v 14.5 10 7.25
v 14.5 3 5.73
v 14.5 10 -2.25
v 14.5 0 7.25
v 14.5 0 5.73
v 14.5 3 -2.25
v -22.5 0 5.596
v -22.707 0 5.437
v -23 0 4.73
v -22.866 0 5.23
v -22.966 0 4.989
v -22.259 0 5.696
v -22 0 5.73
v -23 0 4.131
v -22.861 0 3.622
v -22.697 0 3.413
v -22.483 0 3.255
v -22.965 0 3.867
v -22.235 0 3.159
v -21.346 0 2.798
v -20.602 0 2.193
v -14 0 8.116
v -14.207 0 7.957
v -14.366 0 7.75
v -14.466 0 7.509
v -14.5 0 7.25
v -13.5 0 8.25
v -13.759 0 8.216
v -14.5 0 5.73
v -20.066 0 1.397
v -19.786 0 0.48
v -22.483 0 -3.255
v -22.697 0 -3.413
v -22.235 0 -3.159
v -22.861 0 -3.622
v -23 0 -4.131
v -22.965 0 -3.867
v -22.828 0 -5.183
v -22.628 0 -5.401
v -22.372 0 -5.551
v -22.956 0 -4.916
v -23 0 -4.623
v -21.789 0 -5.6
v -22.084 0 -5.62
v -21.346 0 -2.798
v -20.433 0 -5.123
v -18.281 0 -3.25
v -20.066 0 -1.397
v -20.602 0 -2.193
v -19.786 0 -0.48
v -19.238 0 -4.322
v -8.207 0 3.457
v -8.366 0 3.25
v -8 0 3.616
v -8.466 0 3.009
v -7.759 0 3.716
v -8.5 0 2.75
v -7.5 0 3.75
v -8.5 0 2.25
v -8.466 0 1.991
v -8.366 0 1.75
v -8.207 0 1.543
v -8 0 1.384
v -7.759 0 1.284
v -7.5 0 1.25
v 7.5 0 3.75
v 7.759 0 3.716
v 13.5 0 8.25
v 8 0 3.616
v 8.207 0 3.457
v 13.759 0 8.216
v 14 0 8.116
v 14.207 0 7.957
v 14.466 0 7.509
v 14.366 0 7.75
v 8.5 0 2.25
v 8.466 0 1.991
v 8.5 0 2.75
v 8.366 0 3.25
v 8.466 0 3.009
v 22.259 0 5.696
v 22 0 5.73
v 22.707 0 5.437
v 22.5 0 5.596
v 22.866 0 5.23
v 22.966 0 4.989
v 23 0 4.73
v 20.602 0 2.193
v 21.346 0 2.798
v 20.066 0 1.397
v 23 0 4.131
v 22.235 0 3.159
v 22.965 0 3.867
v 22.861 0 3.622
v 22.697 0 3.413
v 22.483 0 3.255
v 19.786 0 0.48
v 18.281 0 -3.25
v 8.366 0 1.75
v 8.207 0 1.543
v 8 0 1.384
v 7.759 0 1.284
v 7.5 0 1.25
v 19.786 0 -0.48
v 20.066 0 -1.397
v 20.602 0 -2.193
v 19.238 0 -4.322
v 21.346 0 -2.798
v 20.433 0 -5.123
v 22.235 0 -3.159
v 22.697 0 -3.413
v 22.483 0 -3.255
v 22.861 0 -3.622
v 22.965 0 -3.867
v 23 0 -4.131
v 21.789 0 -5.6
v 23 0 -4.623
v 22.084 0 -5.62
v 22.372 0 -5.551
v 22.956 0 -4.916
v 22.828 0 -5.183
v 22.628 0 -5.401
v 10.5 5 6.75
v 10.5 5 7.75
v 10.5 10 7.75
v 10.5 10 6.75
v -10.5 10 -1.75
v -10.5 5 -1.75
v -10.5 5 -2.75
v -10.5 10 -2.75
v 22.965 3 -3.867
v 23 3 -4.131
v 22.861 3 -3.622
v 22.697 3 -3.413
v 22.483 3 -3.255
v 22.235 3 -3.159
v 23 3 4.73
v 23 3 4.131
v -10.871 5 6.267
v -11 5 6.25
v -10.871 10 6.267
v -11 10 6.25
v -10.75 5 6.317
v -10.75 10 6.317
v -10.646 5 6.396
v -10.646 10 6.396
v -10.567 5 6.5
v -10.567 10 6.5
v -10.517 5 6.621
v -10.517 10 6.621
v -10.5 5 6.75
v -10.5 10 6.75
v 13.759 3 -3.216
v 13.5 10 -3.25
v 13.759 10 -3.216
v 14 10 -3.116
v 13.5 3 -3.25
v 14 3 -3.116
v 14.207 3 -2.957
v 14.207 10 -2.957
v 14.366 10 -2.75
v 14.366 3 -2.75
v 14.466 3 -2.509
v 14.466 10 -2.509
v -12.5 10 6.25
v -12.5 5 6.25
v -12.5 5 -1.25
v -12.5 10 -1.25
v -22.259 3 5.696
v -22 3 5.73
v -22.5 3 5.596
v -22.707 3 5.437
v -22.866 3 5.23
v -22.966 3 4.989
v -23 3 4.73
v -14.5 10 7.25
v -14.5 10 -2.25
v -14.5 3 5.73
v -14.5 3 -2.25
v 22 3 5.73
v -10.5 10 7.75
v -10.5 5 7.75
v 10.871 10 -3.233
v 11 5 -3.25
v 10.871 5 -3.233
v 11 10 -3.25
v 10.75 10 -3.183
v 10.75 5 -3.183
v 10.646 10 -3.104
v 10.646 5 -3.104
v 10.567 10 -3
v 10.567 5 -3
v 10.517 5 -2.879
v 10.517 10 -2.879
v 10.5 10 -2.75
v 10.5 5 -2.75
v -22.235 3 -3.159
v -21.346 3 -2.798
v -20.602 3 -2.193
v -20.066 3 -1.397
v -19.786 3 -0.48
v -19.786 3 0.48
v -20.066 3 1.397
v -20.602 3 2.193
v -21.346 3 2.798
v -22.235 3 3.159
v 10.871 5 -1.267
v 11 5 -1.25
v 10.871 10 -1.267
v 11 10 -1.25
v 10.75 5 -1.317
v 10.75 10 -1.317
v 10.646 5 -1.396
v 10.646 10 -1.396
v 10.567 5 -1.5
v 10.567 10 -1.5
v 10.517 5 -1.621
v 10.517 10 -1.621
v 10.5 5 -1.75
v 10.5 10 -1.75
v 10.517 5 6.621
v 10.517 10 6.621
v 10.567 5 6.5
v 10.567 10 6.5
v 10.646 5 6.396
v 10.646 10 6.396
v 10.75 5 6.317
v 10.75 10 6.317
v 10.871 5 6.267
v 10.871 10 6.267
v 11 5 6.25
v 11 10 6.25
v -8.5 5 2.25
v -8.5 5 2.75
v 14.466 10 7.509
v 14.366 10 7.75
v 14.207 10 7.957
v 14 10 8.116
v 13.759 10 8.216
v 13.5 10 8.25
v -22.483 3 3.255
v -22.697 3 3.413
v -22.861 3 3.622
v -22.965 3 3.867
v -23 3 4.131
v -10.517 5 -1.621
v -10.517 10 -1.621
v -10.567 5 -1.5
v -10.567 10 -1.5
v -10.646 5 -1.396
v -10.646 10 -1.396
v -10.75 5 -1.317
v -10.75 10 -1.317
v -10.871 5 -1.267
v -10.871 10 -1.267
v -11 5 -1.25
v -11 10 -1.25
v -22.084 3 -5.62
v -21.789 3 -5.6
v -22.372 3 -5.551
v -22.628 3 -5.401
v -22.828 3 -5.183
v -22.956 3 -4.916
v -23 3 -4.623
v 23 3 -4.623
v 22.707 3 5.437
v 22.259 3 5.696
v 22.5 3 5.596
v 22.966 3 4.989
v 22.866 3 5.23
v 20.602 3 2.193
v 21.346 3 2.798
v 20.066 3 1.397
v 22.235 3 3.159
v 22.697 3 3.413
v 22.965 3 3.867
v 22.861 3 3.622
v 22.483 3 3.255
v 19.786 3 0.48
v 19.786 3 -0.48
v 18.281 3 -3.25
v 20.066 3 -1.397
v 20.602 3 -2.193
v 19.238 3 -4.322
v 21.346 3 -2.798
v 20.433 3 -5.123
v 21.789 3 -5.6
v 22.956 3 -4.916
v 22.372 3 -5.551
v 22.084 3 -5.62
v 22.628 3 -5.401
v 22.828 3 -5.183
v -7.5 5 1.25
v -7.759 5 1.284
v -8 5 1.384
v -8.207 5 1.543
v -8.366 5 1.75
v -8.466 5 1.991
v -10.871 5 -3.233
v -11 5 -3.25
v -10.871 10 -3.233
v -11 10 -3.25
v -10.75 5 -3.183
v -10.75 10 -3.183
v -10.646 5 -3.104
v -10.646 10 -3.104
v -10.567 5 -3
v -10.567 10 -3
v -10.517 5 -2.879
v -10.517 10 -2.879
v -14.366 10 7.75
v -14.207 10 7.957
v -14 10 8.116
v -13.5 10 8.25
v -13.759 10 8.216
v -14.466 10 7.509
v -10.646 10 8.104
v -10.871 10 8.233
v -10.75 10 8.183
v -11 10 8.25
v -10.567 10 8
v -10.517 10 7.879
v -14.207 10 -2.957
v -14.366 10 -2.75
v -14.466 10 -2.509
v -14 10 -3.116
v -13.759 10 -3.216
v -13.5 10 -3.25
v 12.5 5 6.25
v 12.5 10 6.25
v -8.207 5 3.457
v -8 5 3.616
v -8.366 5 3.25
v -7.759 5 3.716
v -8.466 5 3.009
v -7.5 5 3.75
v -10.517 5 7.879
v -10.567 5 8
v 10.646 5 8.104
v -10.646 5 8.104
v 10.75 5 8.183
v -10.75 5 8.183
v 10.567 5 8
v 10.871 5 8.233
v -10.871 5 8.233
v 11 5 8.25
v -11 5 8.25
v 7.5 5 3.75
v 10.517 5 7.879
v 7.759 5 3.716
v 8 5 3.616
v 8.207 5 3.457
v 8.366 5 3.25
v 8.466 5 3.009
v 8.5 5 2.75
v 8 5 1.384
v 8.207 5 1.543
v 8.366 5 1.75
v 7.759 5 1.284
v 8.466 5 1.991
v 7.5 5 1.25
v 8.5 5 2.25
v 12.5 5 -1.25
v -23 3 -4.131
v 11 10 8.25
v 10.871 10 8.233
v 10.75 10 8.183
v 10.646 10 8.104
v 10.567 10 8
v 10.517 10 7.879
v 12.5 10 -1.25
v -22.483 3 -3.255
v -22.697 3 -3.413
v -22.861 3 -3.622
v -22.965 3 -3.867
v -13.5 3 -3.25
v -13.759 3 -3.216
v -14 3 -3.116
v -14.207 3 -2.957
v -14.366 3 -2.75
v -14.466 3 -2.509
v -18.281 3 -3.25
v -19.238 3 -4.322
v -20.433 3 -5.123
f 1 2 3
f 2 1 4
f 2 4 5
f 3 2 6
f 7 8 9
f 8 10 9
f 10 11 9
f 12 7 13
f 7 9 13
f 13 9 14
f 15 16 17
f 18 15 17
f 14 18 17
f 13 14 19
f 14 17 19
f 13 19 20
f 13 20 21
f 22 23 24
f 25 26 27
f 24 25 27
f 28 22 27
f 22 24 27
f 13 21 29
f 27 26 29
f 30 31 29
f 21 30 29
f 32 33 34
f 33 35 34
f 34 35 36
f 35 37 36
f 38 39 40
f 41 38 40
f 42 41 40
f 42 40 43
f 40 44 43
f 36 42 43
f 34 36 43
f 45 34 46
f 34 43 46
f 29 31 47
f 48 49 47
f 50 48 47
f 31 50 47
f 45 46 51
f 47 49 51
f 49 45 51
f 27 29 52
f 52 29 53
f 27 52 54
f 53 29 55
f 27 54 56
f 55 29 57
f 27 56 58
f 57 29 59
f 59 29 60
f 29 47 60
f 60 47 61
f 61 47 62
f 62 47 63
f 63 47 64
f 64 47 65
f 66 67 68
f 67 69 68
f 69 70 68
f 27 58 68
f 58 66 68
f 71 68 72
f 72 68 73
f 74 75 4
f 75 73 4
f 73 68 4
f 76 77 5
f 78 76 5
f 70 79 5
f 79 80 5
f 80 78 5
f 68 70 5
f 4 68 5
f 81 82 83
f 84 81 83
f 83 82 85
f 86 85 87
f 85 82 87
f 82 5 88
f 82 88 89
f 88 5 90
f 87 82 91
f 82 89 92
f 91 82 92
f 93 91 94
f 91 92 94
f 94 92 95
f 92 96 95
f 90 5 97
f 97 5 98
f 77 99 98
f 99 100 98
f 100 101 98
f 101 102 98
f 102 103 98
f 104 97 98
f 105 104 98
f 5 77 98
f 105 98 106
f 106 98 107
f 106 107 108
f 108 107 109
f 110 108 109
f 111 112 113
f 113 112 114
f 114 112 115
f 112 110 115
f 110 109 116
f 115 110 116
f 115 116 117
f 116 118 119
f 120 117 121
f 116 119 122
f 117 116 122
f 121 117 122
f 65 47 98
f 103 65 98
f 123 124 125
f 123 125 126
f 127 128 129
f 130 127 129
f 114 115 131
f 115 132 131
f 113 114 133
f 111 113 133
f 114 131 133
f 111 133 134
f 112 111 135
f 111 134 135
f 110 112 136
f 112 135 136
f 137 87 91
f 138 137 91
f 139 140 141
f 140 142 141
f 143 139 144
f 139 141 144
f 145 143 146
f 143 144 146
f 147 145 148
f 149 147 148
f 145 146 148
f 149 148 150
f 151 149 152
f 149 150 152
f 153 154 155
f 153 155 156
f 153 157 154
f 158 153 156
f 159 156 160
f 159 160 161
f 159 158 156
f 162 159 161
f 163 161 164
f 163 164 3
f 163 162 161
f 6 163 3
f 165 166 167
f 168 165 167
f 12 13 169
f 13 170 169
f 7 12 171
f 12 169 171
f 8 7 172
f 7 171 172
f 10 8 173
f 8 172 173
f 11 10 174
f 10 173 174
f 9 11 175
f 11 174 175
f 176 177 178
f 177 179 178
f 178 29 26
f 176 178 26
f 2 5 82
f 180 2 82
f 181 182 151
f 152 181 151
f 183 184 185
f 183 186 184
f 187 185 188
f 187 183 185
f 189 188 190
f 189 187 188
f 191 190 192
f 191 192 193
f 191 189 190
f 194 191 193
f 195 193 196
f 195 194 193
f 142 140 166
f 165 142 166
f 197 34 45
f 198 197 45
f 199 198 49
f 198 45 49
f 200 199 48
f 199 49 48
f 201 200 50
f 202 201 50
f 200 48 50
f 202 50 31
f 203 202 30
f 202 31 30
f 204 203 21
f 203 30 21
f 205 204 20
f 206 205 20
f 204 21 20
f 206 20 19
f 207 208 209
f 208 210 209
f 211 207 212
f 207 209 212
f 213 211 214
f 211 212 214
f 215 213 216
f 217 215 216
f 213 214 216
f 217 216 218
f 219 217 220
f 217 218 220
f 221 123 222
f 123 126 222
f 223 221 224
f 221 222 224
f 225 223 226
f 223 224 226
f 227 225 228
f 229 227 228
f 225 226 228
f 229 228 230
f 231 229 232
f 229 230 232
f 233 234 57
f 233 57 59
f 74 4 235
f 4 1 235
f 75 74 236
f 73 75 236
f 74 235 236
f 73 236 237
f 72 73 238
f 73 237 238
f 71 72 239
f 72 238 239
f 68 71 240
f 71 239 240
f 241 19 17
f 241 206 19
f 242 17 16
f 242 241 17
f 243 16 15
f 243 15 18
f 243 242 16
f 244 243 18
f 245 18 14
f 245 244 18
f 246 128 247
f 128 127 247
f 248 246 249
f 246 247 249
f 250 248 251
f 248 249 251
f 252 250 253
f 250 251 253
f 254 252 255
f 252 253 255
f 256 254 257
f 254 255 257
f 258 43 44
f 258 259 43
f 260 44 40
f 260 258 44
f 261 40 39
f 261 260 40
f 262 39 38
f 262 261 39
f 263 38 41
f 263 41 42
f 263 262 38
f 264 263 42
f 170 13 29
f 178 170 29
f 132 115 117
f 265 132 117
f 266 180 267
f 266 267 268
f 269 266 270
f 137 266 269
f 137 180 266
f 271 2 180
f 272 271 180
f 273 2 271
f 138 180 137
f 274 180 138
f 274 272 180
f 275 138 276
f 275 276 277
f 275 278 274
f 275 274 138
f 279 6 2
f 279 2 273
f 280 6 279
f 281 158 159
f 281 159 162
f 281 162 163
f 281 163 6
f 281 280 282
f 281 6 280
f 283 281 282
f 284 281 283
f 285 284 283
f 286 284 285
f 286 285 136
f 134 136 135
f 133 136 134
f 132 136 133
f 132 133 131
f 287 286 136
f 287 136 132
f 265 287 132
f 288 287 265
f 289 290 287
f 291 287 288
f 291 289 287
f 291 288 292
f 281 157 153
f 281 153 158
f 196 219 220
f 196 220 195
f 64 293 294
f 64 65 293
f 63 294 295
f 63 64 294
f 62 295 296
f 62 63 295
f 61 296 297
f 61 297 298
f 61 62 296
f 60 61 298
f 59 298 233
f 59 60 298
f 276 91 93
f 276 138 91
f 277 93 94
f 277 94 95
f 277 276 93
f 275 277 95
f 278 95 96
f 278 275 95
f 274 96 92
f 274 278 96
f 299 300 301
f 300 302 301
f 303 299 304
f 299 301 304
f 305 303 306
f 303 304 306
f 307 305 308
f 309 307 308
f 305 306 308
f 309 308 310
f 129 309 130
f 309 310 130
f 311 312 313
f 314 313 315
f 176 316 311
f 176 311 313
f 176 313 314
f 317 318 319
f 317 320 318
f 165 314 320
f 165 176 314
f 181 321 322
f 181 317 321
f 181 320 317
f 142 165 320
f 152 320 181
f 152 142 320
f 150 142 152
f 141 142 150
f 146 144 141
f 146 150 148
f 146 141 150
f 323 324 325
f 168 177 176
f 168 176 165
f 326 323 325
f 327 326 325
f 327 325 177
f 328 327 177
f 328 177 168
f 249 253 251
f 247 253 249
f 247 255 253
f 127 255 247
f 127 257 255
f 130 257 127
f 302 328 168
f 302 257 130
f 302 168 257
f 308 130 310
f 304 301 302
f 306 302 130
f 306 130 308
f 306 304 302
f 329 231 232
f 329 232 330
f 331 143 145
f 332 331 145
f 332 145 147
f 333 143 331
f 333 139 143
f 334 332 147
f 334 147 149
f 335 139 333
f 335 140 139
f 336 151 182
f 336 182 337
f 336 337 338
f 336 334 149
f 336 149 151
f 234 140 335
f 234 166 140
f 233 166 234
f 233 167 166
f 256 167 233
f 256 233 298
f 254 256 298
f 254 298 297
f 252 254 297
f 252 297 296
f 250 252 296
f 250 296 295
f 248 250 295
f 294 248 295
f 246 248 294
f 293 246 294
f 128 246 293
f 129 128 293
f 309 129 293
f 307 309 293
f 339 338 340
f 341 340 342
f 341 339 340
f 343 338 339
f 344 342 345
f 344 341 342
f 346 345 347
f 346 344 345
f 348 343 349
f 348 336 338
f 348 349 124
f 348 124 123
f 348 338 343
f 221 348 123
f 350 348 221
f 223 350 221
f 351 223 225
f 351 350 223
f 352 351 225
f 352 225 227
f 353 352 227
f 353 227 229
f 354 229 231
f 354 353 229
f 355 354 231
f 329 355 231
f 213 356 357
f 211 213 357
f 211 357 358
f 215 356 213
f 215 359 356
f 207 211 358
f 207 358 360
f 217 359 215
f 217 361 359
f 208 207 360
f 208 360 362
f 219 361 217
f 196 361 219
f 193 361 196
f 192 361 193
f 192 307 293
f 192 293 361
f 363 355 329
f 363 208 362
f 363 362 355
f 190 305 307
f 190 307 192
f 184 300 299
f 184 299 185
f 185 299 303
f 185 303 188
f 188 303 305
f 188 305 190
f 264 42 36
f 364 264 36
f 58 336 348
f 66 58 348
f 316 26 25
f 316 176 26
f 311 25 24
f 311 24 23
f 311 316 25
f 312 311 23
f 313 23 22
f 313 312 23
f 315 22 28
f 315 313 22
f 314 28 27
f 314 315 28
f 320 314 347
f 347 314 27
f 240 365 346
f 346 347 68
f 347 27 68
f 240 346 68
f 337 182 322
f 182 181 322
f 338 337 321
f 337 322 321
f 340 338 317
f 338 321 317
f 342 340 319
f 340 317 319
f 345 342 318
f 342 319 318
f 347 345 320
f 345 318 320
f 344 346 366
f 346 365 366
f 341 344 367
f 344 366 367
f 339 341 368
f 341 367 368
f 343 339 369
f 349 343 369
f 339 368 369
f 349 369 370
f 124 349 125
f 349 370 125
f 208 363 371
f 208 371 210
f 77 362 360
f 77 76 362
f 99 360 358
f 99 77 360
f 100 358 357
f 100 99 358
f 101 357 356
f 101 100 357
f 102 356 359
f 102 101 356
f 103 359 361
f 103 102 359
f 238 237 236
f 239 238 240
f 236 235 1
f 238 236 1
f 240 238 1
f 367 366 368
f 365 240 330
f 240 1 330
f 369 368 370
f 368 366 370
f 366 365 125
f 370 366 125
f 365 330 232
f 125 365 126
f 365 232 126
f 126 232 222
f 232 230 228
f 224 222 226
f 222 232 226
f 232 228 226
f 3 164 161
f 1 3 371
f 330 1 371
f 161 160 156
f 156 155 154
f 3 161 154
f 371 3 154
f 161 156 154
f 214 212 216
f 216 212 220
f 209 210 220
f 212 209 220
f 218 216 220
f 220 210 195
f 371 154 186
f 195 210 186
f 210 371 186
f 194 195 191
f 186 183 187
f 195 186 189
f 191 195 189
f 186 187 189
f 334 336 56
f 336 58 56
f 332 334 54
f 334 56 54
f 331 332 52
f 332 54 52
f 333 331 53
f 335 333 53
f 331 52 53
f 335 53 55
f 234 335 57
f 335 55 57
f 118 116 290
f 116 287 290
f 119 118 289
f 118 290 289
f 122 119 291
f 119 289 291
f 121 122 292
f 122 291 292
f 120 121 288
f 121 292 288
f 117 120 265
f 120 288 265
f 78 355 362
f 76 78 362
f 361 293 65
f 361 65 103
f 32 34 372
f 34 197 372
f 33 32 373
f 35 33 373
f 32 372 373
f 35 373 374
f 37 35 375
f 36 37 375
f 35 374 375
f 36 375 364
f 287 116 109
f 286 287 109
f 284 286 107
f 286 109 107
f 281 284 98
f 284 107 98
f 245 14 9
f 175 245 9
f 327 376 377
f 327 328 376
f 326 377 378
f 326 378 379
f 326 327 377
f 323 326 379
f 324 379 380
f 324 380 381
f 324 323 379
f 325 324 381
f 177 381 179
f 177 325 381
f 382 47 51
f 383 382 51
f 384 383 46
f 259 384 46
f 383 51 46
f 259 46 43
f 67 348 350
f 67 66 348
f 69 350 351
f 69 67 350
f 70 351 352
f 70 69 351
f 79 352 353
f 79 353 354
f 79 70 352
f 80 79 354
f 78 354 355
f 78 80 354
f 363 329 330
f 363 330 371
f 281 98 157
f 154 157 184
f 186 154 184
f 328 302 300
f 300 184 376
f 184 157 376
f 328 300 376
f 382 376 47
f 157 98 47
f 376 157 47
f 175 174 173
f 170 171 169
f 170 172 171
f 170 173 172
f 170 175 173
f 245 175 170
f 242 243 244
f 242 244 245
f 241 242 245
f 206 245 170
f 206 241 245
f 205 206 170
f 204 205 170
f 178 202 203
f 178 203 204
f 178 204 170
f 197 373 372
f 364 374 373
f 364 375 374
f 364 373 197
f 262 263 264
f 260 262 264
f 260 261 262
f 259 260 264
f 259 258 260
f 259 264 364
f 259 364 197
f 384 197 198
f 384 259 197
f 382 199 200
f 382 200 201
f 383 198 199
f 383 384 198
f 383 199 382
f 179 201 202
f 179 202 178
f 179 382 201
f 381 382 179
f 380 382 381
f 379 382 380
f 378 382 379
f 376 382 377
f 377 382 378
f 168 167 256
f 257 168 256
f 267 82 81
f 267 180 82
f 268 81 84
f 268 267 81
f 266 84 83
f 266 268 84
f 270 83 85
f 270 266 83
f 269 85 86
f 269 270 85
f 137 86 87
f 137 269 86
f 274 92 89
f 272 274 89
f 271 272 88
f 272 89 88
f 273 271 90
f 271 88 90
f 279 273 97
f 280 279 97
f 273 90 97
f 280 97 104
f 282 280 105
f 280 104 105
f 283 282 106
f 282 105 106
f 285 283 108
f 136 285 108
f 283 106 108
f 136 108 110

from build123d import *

# Parameters (mm, degrees)
MAIN_BODY_DEPTH            = 3
SKETCH2_W                  = 29
SKETCH2_H                  = 11.5
FAN_OFFSET_DEPTH           = 2
FAN_FRAME_DEPTH            = 5
SKETCH4_W                  = 17
SKETCH4_H                  = 2.5
SPEED_HOLE_DEPTH           = 6
CONTOURING_R               = 1
FIT_CLEARANCE_CONTOURING_R = 0.5


with BuildPart() as part:
    # Sketch1 → Main Body (new body)
    with BuildSketch(Plane(origin=(0, 0, 0), x_dir=(1, 0, 0), z_dir=(0, 1, 0))):
        with BuildLine():
            Line((-23, -3.25), (-23, -5.73))
            Line((-23, -5.73), (-14.5, -5.73))
            Line((-14.5, -5.73), (-14.5, -8.25))
            Line((-14.5, -8.25), (14.5, -8.25))
            Line((14.5, -8.25), (14.5, -5.73))
            Line((14.5, -5.73), (23, -5.73))
            Line((23, -5.73), (23, -3.25))
            ThreePointArc((23, -3.25), (19.75, 0), (23, 3.25))
            Line((23, 3.25), (23, 5.73))
            ThreePointArc((23, 5.73), (20.334441897, 5.072248022), (18.280847534, 3.25))
            Line((18.280847534, 3.25), (-18.280847534, 3.25))
            ThreePointArc((-18.280847534, 3.25), (-20.334441897, 5.072248022), (-23, 5.73))
            Line((-23, 5.73), (-23, 3.25))
            ThreePointArc((-23, 3.25), (-19.75, 0), (-23, -3.25))
        make_face()
    extrude(amount=MAIN_BODY_DEPTH)

    # Sketch2 → Fan Offset (add)
    with BuildSketch(Plane(origin=(0, 3, 0), x_dir=(1, 0, 0), z_dir=(0, 1, 0))):
        with Locations((0, -2.5)):
            Rectangle(SKETCH2_W, SKETCH2_H)
    extrude(amount=FAN_OFFSET_DEPTH)

    # Sketch3 → Fan Frame (add)
    with BuildSketch(Plane(origin=(0, 5, 0), x_dir=(1, 0, 0), z_dir=(0, 1, 0))):
        Polygon((-10.5, 3.25), (-14.5, 3.25), (-14.5, -8.25), (-10.5, -8.25), (-10.5, -6.25), (-12.5, -6.25), (-12.5, 1.25), (-10.5, 1.25), align=None)
        Polygon((12.5, -6.25), (12.5, 1.25), (10.5, 1.25), (10.5, 3.25), (14.5, 3.25), (14.5, -8.25), (10.5, -8.25), (10.5, -6.25), align=None)
    extrude(amount=FAN_FRAME_DEPTH)

    # Sketch4 → Speed Hole (cut, through all)
    with BuildSketch(Plane(origin=(0, 5, 0), x_dir=(1, 0, 0), z_dir=(0, 1, 0))):
        with Locations((0, -2.5)):
            Rectangle(SKETCH4_W, SKETCH4_H)
    extrude(amount=-SPEED_HOLE_DEPTH, mode=Mode.SUBTRACT)

    # Contouring
    contouring_edges = [part.edges().sort_by_distance(p)[0] for p in [
        (-14.5, 6.5, -3.25),
        (14.5, 6.5, -3.25),
        (14.5, 5, 8.25),
        (-14.5, 5, 8.25),
        (23, 1.5, 5.73),
        (23, 1.5, 3.25),
        (23, 1.5, -3.25),
        (23, 1.5, -5.73),
        (-23, 1.5, 5.73),
        (-23, 1.5, 3.25),
        (-23, 1.5, -3.25),
        (-23, 1.5, -5.73),
        (-8.5, 2.5, 1.25),
        (-8.5, 2.5, 3.75),
        (8.5, 2.5, 3.75),
        (8.5, 2.5, 1.25),
    ]]
    fillet(contouring_edges, radius=CONTOURING_R)

    # Fit Clearance - Contouring
    fit_clearance_contouring_edges = [part.edges().sort_by_distance(p)[0] for p in [
        (10.5, 7.5, -3.25),
        (-10.5, 7.5, -3.25),
        (-10.5, 7.5, 8.25),
        (-10.5, 7.5, 6.25),
        (10.5, 7.5, 8.25),
        (10.5, 7.5, 6.25),
        (10.5, 7.5, -1.25),
        (-10.5, 7.5, -1.25),
    ]]
    fillet(fit_clearance_contouring_edges, radius=FIT_CLEARANCE_CONTOURING_R)


solid = part.part
